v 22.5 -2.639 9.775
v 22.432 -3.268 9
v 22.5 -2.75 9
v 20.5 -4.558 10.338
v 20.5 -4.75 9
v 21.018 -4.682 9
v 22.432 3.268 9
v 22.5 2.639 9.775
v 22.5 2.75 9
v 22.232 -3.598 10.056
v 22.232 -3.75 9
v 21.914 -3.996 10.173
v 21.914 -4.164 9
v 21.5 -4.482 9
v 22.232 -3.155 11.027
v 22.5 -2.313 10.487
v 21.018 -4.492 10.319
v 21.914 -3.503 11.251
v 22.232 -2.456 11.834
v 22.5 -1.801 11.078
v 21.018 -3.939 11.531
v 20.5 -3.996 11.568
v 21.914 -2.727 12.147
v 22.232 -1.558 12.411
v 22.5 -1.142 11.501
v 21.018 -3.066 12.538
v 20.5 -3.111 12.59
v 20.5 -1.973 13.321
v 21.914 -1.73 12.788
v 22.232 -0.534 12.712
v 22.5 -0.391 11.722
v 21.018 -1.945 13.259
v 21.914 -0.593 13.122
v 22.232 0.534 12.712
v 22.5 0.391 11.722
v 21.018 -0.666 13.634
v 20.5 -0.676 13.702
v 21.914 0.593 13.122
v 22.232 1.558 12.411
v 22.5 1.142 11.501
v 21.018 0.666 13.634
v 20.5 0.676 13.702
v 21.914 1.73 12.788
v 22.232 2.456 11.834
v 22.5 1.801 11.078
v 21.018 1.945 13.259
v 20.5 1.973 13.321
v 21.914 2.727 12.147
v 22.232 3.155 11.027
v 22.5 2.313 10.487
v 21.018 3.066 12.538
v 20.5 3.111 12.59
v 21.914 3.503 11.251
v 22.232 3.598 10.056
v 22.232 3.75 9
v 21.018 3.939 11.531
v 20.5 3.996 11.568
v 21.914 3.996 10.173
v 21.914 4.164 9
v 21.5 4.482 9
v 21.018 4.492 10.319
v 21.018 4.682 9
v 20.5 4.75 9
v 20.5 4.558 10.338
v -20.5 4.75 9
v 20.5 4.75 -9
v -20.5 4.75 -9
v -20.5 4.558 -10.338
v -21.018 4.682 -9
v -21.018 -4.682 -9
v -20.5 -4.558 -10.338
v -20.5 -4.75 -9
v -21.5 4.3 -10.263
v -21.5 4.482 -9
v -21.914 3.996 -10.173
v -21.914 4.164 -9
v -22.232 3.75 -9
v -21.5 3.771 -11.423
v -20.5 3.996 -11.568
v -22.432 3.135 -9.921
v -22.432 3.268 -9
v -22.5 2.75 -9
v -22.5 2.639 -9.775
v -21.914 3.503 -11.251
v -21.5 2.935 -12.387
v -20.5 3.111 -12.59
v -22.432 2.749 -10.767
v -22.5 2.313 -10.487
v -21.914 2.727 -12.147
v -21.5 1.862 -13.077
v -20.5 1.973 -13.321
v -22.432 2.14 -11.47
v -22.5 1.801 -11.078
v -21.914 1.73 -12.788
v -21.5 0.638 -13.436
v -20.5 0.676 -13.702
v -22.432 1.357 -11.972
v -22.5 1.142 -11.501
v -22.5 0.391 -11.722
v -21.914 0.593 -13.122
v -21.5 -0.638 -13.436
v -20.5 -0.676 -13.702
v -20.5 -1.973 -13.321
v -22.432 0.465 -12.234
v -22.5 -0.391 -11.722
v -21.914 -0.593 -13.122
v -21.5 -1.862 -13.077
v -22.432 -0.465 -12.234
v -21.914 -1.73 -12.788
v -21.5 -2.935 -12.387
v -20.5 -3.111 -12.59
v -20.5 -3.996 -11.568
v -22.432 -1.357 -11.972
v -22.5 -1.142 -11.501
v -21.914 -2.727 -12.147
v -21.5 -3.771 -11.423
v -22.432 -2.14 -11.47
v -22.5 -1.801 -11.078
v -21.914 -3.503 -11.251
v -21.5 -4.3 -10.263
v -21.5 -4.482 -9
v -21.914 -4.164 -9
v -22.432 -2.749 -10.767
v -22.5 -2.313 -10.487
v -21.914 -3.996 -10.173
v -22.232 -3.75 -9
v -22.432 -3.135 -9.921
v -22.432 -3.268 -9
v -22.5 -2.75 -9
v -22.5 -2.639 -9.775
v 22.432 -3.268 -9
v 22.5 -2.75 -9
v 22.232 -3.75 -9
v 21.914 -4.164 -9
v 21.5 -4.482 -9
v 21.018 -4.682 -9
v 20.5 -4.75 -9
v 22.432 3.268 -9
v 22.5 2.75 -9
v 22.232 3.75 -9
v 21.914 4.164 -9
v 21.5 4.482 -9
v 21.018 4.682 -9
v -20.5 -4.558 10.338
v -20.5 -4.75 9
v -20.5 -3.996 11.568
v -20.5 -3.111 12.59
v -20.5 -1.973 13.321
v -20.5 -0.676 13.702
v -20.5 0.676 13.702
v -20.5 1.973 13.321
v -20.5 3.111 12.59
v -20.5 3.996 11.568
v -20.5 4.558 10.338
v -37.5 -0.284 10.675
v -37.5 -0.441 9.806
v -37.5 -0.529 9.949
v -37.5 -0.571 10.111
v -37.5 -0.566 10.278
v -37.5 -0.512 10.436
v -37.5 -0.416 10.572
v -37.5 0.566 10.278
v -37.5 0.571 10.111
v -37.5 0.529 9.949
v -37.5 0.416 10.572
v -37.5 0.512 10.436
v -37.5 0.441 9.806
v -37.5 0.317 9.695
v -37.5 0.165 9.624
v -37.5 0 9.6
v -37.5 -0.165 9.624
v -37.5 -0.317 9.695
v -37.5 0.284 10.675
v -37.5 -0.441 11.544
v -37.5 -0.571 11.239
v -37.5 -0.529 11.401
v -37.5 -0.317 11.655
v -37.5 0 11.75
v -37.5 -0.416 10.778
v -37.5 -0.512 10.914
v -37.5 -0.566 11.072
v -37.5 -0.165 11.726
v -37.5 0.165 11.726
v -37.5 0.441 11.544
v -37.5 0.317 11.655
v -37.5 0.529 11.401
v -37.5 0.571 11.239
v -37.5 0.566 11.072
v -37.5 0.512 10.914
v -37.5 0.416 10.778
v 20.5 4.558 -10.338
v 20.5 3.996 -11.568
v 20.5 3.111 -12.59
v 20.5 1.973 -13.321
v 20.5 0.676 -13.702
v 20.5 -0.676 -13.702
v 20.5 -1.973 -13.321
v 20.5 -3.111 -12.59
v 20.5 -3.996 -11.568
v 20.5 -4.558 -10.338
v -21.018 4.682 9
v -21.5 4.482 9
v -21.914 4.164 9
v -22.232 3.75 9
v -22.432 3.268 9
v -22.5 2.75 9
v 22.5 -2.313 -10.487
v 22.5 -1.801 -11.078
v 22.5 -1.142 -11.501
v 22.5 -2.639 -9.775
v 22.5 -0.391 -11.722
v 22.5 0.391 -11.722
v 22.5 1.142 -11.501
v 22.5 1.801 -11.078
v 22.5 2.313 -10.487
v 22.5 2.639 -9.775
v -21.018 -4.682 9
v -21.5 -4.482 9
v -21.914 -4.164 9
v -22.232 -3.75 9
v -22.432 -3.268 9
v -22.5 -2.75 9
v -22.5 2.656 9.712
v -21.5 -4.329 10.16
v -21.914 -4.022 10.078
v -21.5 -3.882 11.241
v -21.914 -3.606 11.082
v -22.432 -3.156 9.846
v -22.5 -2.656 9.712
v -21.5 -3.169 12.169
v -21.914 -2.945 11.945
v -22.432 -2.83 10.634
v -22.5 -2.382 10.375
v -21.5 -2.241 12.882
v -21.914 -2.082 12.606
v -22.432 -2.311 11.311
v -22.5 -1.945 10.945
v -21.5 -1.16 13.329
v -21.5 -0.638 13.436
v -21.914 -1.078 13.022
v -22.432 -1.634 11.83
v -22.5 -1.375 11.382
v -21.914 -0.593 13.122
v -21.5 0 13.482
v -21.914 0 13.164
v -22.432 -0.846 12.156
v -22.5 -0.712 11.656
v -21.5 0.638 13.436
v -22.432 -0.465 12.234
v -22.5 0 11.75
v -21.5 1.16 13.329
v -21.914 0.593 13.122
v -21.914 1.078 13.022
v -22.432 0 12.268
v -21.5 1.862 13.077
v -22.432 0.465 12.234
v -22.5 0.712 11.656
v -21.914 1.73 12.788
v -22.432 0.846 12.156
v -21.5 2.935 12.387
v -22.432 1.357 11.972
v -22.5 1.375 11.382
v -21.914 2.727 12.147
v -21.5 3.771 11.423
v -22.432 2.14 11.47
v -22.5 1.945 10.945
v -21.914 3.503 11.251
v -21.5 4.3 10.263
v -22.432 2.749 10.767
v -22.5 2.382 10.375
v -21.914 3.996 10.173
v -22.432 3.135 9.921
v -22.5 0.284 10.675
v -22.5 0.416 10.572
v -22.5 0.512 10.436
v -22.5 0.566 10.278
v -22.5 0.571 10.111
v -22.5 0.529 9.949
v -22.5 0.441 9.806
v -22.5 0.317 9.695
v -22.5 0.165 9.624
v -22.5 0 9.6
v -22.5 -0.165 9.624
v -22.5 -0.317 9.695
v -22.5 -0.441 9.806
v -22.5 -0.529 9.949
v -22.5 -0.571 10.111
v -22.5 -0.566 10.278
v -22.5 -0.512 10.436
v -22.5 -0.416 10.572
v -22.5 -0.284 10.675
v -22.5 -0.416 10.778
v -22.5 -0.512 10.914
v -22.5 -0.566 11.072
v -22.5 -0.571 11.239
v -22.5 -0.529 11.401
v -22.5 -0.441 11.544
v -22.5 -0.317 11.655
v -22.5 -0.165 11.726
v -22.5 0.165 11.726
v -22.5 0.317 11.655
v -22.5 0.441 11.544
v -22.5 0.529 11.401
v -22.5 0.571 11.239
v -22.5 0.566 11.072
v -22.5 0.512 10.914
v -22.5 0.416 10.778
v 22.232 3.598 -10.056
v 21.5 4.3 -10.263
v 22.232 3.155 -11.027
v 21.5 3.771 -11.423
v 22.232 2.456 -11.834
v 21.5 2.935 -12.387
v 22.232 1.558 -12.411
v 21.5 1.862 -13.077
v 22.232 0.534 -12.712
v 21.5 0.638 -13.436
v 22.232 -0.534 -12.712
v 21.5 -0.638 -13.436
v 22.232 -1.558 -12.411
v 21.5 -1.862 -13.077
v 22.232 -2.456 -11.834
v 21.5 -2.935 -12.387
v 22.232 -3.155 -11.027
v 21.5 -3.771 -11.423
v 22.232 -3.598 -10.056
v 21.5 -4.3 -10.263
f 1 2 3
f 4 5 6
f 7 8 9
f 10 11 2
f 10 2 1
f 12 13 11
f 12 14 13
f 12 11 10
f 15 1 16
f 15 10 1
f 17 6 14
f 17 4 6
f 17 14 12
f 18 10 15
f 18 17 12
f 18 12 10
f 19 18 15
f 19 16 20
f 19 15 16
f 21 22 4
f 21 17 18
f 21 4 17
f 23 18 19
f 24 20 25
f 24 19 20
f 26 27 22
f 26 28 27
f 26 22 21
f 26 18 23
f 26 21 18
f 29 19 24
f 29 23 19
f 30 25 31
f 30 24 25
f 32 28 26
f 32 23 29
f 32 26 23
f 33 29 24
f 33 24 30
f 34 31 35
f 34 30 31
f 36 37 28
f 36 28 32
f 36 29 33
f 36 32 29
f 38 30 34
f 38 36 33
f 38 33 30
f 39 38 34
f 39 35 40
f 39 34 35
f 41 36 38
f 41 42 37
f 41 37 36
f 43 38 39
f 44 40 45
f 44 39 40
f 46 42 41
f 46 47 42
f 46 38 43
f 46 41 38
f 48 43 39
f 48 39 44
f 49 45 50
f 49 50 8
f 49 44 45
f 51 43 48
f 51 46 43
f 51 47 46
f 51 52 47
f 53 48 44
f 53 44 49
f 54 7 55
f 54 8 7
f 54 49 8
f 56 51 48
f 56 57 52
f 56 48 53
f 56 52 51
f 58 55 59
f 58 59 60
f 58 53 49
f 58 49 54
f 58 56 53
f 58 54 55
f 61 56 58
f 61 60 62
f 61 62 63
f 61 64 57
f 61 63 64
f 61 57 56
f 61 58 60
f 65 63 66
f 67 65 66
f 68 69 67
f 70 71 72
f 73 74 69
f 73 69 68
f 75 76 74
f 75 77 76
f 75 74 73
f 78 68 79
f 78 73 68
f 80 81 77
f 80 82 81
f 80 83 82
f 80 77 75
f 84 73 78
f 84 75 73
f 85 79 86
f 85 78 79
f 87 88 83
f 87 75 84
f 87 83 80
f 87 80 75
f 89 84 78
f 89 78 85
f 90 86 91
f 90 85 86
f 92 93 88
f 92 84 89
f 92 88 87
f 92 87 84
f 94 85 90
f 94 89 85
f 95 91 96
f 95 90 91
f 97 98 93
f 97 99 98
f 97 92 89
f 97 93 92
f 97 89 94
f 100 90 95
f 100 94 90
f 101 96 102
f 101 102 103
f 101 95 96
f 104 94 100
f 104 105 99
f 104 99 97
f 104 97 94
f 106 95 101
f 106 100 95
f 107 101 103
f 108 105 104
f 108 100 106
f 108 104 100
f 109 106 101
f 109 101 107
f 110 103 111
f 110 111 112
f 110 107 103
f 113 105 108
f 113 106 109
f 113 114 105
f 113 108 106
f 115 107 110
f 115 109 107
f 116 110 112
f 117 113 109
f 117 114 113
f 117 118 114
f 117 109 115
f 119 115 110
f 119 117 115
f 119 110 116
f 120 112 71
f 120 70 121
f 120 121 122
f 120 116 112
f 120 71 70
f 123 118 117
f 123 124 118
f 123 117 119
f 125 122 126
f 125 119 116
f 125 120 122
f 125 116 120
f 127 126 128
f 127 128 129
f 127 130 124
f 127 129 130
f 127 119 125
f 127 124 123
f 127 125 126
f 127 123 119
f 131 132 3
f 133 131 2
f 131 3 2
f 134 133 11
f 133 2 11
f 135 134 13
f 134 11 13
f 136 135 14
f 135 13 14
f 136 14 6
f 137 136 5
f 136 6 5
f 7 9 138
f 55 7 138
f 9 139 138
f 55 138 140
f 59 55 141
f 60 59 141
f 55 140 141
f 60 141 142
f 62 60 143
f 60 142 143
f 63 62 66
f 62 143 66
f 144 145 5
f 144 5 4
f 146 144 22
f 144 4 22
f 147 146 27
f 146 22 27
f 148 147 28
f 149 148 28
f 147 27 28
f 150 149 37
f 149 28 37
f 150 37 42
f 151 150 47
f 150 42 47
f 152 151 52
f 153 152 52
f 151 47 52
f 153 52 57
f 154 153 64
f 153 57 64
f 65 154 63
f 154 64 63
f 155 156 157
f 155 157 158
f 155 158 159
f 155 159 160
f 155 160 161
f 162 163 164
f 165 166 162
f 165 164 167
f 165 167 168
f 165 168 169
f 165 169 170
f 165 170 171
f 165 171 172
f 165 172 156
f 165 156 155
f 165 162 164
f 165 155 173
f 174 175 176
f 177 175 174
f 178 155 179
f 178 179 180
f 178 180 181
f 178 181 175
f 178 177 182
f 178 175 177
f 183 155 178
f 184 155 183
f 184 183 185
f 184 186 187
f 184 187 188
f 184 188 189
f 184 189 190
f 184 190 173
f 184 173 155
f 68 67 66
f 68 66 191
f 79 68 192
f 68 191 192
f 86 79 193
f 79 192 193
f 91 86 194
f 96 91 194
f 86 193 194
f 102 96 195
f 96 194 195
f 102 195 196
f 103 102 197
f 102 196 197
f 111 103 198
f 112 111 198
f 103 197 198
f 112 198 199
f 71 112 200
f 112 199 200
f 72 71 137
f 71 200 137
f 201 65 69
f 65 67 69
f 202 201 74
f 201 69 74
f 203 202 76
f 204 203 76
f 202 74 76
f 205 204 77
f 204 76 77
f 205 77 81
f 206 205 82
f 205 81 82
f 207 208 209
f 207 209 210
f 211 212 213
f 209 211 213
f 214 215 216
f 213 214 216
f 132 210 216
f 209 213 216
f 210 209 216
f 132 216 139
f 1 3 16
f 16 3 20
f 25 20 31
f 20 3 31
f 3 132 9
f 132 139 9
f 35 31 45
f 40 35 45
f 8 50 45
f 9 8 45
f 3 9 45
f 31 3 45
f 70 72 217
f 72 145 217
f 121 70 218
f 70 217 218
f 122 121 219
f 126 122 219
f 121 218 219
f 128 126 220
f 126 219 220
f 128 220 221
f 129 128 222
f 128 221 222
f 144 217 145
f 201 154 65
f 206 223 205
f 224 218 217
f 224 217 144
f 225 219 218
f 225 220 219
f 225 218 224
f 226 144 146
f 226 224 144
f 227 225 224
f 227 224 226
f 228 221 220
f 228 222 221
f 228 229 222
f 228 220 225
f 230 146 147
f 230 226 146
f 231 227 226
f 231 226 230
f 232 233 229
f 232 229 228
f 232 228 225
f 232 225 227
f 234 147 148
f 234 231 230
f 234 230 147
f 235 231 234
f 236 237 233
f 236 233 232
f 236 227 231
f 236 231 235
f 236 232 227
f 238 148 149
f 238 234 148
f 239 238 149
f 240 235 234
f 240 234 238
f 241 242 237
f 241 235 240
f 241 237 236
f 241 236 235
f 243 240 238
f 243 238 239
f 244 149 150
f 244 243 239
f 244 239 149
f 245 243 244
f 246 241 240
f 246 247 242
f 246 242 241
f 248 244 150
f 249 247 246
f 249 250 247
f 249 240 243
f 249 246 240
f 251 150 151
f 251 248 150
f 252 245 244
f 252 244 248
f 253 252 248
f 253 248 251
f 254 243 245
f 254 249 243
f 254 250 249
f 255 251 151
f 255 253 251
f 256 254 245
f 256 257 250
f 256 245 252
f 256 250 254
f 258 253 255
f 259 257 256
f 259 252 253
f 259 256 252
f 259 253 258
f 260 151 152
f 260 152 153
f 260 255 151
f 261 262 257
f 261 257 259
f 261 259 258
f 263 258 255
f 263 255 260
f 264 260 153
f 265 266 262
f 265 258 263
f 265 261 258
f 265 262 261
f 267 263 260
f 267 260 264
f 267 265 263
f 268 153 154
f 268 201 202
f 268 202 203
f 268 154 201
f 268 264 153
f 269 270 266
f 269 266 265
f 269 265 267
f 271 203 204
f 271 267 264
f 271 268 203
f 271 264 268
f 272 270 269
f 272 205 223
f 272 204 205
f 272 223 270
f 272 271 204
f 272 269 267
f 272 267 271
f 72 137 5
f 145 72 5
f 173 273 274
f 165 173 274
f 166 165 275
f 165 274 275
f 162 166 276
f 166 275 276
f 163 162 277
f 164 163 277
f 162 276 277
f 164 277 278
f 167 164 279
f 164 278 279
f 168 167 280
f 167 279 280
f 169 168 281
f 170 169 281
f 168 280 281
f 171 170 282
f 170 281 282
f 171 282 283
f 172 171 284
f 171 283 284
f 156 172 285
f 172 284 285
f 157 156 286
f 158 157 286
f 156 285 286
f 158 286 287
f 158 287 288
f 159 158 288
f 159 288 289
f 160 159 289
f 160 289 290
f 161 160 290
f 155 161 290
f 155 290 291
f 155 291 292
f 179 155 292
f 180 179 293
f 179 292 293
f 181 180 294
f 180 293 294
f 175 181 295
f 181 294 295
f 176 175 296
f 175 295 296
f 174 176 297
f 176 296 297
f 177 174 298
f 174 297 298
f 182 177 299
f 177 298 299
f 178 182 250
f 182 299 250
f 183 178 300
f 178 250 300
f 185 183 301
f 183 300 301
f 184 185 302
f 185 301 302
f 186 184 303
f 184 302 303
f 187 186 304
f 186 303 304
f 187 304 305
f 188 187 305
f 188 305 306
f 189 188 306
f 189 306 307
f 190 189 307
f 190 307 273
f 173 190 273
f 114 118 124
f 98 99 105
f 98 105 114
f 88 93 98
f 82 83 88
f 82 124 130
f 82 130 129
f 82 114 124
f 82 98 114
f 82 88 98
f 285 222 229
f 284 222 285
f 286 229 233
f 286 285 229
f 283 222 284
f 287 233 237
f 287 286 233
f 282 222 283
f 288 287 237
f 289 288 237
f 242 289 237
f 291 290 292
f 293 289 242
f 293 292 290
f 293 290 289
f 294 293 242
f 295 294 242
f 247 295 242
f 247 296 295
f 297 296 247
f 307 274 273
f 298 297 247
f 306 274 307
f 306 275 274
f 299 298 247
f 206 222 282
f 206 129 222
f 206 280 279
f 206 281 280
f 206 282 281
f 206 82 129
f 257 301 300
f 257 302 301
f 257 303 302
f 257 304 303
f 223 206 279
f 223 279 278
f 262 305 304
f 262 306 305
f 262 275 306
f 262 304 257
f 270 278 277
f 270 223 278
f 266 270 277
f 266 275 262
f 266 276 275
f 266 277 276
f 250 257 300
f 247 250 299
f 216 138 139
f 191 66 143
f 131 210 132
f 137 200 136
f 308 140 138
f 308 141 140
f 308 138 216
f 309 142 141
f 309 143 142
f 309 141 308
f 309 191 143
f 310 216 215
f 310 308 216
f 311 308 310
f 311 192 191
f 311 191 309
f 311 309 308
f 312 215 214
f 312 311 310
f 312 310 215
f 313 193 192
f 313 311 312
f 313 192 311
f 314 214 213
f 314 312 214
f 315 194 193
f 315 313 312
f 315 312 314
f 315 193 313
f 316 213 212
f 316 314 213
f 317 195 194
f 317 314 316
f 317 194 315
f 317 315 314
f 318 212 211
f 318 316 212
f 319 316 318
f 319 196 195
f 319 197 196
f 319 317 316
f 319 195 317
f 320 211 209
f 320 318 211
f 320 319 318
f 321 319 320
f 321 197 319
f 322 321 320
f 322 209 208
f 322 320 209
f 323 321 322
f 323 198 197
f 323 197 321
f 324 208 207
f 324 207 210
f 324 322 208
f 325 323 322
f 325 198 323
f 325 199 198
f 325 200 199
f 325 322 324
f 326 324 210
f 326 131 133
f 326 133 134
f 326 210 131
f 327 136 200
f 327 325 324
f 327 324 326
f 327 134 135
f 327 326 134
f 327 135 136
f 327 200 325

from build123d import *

# Parameters (mm, degrees)
BOSS_EXTRUDE1_DEPTH = 22.5
FILLET1_R           = 2
BOSS_EXTRUDE2_DEPTH = 15


with BuildPart() as part:
    # Sketch1 → Boss-Extrude1 (new, symmetric)
    with BuildSketch(Plane(origin=(0, 0, 0), x_dir=(0, 0, -1), z_dir=(1, 0, 0))):
        with BuildLine():
            Line((-9, 4.75), (9, 4.75))
            ThreePointArc((9, 4.75), (13.75, 0), (9, -4.75))
            Line((9, -4.75), (-9, -4.75))
            ThreePointArc((-9, -4.75), (-13.75, 0), (-9, 4.75))
        make_face()
    extrude(amount=BOSS_EXTRUDE1_DEPTH, both=True)

    # Fillet1
    fillet1_edges = [part.edges().sort_by_distance(p)[0] for p in [
        (22.5, 0, -13.75),
        (22.5, 4.75, 0),
        (22.5, 0, 13.75),
        (-22.5, 4.75, 0),
        (-22.5, 0, -13.75),
        (-22.5, -4.75, 0),
        (-22.5, 0, 13.75),
        (22.5, -4.75, 0),
    ]]
    fillet(fillet1_edges, radius=FILLET1_R)

    # Sketch2 → Boss-Extrude2 (add)
    with BuildSketch(Plane.ZY.offset(22.5)):
        with BuildLine():
            ThreePointArc((10.675, 0.283945417), (9.6, 0), (10.675, -0.283945417))
            ThreePointArc((10.675, -0.283945417), (11.75, 0), (10.675, 0.283945417))
        make_face()
    extrude(amount=BOSS_EXTRUDE2_DEPTH)


solid = part.part
